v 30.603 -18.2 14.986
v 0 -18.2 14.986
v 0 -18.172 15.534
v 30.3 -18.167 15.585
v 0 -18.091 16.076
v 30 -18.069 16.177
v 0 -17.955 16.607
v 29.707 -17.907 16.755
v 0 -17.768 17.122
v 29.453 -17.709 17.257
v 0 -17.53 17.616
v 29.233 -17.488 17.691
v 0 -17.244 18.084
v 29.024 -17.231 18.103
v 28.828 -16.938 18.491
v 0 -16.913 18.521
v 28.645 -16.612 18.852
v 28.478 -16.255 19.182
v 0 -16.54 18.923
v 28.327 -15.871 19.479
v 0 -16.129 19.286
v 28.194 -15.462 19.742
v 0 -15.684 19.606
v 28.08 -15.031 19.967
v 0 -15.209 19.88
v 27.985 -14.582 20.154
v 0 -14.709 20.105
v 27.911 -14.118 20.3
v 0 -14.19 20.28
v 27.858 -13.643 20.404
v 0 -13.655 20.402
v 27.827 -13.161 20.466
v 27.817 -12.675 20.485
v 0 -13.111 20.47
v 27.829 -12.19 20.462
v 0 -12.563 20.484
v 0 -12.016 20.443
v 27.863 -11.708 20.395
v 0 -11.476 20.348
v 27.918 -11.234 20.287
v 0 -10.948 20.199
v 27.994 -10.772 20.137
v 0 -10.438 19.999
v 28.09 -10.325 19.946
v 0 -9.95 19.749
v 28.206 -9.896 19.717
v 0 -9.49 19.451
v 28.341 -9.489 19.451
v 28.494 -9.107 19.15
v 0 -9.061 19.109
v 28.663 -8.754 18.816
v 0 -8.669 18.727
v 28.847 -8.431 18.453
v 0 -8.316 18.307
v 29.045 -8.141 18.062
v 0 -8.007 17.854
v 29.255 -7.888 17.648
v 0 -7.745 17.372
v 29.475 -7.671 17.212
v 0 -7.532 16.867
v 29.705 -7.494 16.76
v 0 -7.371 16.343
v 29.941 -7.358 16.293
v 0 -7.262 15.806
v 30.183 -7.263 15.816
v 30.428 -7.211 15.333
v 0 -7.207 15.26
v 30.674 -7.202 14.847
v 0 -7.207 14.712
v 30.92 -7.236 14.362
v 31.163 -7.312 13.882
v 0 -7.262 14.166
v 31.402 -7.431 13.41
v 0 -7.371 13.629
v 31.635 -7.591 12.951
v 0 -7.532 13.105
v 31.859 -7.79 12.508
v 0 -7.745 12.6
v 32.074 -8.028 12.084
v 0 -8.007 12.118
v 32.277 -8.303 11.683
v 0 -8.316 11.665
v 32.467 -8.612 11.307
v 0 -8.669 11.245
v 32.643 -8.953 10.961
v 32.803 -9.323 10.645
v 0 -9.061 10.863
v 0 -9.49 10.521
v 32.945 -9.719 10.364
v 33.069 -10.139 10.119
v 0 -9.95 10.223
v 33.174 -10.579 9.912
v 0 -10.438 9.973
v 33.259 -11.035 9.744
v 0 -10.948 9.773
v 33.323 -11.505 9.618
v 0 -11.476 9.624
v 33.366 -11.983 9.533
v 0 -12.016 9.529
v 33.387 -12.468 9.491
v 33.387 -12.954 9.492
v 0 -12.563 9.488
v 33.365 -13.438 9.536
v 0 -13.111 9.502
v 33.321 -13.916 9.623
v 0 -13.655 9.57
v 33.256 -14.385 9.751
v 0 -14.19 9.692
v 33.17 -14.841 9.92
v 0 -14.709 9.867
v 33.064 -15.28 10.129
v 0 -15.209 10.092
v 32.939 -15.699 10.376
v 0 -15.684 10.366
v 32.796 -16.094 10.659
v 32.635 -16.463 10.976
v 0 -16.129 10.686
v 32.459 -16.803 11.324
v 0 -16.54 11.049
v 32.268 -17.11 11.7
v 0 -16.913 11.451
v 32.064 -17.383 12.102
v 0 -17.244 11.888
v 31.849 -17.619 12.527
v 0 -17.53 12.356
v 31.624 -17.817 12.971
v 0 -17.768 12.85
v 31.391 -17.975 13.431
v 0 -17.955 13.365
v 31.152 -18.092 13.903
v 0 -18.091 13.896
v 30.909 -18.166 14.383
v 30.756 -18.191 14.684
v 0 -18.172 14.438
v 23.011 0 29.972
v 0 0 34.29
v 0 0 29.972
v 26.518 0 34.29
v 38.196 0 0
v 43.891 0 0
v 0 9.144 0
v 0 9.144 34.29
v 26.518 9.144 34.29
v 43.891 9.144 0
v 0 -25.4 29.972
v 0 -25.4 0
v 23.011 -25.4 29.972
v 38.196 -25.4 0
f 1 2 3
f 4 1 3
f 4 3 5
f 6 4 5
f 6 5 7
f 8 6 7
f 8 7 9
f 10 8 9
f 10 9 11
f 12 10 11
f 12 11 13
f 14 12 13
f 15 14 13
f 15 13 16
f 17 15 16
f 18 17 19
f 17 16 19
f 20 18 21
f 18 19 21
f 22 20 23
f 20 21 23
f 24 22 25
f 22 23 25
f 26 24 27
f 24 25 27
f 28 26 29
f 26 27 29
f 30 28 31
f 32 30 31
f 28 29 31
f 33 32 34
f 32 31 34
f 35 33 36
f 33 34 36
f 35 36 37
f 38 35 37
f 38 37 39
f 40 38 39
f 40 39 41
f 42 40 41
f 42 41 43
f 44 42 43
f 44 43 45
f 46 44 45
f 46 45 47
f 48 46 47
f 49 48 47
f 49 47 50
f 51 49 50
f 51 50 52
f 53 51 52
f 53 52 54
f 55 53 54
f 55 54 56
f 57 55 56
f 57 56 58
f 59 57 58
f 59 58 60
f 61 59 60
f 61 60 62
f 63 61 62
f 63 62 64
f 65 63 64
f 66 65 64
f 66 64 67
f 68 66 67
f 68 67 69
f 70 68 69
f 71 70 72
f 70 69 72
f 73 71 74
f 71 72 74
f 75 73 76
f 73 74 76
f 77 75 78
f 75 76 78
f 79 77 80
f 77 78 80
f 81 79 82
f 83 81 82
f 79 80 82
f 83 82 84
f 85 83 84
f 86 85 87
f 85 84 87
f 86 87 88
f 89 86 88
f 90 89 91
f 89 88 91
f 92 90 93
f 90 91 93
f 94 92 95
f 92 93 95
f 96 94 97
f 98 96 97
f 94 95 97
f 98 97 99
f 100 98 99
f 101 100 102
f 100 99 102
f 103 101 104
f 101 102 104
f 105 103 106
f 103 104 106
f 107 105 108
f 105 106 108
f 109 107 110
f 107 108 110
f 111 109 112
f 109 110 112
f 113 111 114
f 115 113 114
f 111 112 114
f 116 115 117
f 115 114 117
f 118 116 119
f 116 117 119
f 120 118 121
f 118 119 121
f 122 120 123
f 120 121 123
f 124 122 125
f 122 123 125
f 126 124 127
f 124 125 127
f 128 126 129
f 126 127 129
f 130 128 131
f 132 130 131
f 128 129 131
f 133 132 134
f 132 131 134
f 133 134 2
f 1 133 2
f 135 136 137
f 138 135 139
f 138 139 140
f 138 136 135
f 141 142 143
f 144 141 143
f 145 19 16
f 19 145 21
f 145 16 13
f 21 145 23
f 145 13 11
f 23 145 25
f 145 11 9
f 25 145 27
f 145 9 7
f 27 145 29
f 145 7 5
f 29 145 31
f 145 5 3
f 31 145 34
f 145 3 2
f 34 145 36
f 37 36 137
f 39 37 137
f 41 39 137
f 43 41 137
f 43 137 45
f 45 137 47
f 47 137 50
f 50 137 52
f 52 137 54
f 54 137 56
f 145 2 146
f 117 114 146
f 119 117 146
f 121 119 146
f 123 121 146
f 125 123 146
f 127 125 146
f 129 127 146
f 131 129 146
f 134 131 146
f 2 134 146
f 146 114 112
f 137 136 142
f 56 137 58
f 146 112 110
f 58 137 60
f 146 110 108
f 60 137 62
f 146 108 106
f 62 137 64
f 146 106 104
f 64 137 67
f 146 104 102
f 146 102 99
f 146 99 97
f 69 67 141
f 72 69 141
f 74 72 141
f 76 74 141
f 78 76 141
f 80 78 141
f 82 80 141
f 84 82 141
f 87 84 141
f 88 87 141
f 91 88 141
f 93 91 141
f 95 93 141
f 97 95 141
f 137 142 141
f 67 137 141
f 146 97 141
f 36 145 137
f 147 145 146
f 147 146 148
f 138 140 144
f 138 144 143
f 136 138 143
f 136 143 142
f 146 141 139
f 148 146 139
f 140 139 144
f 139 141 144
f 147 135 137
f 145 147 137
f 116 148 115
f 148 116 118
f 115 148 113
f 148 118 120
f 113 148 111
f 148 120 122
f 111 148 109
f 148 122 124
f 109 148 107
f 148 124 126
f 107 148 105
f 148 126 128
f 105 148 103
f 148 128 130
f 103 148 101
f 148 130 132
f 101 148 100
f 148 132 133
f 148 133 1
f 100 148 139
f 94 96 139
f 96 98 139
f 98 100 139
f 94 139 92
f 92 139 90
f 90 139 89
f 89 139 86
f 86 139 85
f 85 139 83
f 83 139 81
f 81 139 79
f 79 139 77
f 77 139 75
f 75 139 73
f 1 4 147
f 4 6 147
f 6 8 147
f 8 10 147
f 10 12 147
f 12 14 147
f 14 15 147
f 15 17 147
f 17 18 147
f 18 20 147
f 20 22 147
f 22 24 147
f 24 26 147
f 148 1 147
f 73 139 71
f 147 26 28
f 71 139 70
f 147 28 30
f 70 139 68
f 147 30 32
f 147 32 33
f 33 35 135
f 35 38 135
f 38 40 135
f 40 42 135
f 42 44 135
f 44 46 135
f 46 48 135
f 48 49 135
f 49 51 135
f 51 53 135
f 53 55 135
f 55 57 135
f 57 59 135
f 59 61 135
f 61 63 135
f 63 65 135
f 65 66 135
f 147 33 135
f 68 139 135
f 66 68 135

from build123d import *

# Parameters (mm, degrees)
F1_DEPTH = 9.144
F3_DEPTH = 25.4
F4_R     = 5.499555
F5_DEPTH = 43.892203


with BuildPart() as f1:
    # F0 (on Front) → F1 (new body)
    with BuildSketch(Plane.XZ):
        Polygon((0, 34.29), (0, 0), (43.891203, 0), (26.5176, 34.29), align=None)
    extrude(amount=-F1_DEPTH)

    # F2 (on Front) → F3 (join)
    with BuildSketch(Plane.XZ):
        Polygon((38.196363, 0), (23.010547, 29.972), (0, 29.972), (0, 0), align=None)
    extrude(amount=F3_DEPTH)

    # F4 (on face) → F5 (cut, through all)
    with BuildSketch(Plane(origin=(0, 0, 0), x_dir=(0, -1, 0), z_dir=(-1, 0, 0))):
        with Locations((12.7, 14.986)):
            Circle(F4_R)
    extrude(amount=-F5_DEPTH, mode=Mode.SUBTRACT)


solid = f1.part
